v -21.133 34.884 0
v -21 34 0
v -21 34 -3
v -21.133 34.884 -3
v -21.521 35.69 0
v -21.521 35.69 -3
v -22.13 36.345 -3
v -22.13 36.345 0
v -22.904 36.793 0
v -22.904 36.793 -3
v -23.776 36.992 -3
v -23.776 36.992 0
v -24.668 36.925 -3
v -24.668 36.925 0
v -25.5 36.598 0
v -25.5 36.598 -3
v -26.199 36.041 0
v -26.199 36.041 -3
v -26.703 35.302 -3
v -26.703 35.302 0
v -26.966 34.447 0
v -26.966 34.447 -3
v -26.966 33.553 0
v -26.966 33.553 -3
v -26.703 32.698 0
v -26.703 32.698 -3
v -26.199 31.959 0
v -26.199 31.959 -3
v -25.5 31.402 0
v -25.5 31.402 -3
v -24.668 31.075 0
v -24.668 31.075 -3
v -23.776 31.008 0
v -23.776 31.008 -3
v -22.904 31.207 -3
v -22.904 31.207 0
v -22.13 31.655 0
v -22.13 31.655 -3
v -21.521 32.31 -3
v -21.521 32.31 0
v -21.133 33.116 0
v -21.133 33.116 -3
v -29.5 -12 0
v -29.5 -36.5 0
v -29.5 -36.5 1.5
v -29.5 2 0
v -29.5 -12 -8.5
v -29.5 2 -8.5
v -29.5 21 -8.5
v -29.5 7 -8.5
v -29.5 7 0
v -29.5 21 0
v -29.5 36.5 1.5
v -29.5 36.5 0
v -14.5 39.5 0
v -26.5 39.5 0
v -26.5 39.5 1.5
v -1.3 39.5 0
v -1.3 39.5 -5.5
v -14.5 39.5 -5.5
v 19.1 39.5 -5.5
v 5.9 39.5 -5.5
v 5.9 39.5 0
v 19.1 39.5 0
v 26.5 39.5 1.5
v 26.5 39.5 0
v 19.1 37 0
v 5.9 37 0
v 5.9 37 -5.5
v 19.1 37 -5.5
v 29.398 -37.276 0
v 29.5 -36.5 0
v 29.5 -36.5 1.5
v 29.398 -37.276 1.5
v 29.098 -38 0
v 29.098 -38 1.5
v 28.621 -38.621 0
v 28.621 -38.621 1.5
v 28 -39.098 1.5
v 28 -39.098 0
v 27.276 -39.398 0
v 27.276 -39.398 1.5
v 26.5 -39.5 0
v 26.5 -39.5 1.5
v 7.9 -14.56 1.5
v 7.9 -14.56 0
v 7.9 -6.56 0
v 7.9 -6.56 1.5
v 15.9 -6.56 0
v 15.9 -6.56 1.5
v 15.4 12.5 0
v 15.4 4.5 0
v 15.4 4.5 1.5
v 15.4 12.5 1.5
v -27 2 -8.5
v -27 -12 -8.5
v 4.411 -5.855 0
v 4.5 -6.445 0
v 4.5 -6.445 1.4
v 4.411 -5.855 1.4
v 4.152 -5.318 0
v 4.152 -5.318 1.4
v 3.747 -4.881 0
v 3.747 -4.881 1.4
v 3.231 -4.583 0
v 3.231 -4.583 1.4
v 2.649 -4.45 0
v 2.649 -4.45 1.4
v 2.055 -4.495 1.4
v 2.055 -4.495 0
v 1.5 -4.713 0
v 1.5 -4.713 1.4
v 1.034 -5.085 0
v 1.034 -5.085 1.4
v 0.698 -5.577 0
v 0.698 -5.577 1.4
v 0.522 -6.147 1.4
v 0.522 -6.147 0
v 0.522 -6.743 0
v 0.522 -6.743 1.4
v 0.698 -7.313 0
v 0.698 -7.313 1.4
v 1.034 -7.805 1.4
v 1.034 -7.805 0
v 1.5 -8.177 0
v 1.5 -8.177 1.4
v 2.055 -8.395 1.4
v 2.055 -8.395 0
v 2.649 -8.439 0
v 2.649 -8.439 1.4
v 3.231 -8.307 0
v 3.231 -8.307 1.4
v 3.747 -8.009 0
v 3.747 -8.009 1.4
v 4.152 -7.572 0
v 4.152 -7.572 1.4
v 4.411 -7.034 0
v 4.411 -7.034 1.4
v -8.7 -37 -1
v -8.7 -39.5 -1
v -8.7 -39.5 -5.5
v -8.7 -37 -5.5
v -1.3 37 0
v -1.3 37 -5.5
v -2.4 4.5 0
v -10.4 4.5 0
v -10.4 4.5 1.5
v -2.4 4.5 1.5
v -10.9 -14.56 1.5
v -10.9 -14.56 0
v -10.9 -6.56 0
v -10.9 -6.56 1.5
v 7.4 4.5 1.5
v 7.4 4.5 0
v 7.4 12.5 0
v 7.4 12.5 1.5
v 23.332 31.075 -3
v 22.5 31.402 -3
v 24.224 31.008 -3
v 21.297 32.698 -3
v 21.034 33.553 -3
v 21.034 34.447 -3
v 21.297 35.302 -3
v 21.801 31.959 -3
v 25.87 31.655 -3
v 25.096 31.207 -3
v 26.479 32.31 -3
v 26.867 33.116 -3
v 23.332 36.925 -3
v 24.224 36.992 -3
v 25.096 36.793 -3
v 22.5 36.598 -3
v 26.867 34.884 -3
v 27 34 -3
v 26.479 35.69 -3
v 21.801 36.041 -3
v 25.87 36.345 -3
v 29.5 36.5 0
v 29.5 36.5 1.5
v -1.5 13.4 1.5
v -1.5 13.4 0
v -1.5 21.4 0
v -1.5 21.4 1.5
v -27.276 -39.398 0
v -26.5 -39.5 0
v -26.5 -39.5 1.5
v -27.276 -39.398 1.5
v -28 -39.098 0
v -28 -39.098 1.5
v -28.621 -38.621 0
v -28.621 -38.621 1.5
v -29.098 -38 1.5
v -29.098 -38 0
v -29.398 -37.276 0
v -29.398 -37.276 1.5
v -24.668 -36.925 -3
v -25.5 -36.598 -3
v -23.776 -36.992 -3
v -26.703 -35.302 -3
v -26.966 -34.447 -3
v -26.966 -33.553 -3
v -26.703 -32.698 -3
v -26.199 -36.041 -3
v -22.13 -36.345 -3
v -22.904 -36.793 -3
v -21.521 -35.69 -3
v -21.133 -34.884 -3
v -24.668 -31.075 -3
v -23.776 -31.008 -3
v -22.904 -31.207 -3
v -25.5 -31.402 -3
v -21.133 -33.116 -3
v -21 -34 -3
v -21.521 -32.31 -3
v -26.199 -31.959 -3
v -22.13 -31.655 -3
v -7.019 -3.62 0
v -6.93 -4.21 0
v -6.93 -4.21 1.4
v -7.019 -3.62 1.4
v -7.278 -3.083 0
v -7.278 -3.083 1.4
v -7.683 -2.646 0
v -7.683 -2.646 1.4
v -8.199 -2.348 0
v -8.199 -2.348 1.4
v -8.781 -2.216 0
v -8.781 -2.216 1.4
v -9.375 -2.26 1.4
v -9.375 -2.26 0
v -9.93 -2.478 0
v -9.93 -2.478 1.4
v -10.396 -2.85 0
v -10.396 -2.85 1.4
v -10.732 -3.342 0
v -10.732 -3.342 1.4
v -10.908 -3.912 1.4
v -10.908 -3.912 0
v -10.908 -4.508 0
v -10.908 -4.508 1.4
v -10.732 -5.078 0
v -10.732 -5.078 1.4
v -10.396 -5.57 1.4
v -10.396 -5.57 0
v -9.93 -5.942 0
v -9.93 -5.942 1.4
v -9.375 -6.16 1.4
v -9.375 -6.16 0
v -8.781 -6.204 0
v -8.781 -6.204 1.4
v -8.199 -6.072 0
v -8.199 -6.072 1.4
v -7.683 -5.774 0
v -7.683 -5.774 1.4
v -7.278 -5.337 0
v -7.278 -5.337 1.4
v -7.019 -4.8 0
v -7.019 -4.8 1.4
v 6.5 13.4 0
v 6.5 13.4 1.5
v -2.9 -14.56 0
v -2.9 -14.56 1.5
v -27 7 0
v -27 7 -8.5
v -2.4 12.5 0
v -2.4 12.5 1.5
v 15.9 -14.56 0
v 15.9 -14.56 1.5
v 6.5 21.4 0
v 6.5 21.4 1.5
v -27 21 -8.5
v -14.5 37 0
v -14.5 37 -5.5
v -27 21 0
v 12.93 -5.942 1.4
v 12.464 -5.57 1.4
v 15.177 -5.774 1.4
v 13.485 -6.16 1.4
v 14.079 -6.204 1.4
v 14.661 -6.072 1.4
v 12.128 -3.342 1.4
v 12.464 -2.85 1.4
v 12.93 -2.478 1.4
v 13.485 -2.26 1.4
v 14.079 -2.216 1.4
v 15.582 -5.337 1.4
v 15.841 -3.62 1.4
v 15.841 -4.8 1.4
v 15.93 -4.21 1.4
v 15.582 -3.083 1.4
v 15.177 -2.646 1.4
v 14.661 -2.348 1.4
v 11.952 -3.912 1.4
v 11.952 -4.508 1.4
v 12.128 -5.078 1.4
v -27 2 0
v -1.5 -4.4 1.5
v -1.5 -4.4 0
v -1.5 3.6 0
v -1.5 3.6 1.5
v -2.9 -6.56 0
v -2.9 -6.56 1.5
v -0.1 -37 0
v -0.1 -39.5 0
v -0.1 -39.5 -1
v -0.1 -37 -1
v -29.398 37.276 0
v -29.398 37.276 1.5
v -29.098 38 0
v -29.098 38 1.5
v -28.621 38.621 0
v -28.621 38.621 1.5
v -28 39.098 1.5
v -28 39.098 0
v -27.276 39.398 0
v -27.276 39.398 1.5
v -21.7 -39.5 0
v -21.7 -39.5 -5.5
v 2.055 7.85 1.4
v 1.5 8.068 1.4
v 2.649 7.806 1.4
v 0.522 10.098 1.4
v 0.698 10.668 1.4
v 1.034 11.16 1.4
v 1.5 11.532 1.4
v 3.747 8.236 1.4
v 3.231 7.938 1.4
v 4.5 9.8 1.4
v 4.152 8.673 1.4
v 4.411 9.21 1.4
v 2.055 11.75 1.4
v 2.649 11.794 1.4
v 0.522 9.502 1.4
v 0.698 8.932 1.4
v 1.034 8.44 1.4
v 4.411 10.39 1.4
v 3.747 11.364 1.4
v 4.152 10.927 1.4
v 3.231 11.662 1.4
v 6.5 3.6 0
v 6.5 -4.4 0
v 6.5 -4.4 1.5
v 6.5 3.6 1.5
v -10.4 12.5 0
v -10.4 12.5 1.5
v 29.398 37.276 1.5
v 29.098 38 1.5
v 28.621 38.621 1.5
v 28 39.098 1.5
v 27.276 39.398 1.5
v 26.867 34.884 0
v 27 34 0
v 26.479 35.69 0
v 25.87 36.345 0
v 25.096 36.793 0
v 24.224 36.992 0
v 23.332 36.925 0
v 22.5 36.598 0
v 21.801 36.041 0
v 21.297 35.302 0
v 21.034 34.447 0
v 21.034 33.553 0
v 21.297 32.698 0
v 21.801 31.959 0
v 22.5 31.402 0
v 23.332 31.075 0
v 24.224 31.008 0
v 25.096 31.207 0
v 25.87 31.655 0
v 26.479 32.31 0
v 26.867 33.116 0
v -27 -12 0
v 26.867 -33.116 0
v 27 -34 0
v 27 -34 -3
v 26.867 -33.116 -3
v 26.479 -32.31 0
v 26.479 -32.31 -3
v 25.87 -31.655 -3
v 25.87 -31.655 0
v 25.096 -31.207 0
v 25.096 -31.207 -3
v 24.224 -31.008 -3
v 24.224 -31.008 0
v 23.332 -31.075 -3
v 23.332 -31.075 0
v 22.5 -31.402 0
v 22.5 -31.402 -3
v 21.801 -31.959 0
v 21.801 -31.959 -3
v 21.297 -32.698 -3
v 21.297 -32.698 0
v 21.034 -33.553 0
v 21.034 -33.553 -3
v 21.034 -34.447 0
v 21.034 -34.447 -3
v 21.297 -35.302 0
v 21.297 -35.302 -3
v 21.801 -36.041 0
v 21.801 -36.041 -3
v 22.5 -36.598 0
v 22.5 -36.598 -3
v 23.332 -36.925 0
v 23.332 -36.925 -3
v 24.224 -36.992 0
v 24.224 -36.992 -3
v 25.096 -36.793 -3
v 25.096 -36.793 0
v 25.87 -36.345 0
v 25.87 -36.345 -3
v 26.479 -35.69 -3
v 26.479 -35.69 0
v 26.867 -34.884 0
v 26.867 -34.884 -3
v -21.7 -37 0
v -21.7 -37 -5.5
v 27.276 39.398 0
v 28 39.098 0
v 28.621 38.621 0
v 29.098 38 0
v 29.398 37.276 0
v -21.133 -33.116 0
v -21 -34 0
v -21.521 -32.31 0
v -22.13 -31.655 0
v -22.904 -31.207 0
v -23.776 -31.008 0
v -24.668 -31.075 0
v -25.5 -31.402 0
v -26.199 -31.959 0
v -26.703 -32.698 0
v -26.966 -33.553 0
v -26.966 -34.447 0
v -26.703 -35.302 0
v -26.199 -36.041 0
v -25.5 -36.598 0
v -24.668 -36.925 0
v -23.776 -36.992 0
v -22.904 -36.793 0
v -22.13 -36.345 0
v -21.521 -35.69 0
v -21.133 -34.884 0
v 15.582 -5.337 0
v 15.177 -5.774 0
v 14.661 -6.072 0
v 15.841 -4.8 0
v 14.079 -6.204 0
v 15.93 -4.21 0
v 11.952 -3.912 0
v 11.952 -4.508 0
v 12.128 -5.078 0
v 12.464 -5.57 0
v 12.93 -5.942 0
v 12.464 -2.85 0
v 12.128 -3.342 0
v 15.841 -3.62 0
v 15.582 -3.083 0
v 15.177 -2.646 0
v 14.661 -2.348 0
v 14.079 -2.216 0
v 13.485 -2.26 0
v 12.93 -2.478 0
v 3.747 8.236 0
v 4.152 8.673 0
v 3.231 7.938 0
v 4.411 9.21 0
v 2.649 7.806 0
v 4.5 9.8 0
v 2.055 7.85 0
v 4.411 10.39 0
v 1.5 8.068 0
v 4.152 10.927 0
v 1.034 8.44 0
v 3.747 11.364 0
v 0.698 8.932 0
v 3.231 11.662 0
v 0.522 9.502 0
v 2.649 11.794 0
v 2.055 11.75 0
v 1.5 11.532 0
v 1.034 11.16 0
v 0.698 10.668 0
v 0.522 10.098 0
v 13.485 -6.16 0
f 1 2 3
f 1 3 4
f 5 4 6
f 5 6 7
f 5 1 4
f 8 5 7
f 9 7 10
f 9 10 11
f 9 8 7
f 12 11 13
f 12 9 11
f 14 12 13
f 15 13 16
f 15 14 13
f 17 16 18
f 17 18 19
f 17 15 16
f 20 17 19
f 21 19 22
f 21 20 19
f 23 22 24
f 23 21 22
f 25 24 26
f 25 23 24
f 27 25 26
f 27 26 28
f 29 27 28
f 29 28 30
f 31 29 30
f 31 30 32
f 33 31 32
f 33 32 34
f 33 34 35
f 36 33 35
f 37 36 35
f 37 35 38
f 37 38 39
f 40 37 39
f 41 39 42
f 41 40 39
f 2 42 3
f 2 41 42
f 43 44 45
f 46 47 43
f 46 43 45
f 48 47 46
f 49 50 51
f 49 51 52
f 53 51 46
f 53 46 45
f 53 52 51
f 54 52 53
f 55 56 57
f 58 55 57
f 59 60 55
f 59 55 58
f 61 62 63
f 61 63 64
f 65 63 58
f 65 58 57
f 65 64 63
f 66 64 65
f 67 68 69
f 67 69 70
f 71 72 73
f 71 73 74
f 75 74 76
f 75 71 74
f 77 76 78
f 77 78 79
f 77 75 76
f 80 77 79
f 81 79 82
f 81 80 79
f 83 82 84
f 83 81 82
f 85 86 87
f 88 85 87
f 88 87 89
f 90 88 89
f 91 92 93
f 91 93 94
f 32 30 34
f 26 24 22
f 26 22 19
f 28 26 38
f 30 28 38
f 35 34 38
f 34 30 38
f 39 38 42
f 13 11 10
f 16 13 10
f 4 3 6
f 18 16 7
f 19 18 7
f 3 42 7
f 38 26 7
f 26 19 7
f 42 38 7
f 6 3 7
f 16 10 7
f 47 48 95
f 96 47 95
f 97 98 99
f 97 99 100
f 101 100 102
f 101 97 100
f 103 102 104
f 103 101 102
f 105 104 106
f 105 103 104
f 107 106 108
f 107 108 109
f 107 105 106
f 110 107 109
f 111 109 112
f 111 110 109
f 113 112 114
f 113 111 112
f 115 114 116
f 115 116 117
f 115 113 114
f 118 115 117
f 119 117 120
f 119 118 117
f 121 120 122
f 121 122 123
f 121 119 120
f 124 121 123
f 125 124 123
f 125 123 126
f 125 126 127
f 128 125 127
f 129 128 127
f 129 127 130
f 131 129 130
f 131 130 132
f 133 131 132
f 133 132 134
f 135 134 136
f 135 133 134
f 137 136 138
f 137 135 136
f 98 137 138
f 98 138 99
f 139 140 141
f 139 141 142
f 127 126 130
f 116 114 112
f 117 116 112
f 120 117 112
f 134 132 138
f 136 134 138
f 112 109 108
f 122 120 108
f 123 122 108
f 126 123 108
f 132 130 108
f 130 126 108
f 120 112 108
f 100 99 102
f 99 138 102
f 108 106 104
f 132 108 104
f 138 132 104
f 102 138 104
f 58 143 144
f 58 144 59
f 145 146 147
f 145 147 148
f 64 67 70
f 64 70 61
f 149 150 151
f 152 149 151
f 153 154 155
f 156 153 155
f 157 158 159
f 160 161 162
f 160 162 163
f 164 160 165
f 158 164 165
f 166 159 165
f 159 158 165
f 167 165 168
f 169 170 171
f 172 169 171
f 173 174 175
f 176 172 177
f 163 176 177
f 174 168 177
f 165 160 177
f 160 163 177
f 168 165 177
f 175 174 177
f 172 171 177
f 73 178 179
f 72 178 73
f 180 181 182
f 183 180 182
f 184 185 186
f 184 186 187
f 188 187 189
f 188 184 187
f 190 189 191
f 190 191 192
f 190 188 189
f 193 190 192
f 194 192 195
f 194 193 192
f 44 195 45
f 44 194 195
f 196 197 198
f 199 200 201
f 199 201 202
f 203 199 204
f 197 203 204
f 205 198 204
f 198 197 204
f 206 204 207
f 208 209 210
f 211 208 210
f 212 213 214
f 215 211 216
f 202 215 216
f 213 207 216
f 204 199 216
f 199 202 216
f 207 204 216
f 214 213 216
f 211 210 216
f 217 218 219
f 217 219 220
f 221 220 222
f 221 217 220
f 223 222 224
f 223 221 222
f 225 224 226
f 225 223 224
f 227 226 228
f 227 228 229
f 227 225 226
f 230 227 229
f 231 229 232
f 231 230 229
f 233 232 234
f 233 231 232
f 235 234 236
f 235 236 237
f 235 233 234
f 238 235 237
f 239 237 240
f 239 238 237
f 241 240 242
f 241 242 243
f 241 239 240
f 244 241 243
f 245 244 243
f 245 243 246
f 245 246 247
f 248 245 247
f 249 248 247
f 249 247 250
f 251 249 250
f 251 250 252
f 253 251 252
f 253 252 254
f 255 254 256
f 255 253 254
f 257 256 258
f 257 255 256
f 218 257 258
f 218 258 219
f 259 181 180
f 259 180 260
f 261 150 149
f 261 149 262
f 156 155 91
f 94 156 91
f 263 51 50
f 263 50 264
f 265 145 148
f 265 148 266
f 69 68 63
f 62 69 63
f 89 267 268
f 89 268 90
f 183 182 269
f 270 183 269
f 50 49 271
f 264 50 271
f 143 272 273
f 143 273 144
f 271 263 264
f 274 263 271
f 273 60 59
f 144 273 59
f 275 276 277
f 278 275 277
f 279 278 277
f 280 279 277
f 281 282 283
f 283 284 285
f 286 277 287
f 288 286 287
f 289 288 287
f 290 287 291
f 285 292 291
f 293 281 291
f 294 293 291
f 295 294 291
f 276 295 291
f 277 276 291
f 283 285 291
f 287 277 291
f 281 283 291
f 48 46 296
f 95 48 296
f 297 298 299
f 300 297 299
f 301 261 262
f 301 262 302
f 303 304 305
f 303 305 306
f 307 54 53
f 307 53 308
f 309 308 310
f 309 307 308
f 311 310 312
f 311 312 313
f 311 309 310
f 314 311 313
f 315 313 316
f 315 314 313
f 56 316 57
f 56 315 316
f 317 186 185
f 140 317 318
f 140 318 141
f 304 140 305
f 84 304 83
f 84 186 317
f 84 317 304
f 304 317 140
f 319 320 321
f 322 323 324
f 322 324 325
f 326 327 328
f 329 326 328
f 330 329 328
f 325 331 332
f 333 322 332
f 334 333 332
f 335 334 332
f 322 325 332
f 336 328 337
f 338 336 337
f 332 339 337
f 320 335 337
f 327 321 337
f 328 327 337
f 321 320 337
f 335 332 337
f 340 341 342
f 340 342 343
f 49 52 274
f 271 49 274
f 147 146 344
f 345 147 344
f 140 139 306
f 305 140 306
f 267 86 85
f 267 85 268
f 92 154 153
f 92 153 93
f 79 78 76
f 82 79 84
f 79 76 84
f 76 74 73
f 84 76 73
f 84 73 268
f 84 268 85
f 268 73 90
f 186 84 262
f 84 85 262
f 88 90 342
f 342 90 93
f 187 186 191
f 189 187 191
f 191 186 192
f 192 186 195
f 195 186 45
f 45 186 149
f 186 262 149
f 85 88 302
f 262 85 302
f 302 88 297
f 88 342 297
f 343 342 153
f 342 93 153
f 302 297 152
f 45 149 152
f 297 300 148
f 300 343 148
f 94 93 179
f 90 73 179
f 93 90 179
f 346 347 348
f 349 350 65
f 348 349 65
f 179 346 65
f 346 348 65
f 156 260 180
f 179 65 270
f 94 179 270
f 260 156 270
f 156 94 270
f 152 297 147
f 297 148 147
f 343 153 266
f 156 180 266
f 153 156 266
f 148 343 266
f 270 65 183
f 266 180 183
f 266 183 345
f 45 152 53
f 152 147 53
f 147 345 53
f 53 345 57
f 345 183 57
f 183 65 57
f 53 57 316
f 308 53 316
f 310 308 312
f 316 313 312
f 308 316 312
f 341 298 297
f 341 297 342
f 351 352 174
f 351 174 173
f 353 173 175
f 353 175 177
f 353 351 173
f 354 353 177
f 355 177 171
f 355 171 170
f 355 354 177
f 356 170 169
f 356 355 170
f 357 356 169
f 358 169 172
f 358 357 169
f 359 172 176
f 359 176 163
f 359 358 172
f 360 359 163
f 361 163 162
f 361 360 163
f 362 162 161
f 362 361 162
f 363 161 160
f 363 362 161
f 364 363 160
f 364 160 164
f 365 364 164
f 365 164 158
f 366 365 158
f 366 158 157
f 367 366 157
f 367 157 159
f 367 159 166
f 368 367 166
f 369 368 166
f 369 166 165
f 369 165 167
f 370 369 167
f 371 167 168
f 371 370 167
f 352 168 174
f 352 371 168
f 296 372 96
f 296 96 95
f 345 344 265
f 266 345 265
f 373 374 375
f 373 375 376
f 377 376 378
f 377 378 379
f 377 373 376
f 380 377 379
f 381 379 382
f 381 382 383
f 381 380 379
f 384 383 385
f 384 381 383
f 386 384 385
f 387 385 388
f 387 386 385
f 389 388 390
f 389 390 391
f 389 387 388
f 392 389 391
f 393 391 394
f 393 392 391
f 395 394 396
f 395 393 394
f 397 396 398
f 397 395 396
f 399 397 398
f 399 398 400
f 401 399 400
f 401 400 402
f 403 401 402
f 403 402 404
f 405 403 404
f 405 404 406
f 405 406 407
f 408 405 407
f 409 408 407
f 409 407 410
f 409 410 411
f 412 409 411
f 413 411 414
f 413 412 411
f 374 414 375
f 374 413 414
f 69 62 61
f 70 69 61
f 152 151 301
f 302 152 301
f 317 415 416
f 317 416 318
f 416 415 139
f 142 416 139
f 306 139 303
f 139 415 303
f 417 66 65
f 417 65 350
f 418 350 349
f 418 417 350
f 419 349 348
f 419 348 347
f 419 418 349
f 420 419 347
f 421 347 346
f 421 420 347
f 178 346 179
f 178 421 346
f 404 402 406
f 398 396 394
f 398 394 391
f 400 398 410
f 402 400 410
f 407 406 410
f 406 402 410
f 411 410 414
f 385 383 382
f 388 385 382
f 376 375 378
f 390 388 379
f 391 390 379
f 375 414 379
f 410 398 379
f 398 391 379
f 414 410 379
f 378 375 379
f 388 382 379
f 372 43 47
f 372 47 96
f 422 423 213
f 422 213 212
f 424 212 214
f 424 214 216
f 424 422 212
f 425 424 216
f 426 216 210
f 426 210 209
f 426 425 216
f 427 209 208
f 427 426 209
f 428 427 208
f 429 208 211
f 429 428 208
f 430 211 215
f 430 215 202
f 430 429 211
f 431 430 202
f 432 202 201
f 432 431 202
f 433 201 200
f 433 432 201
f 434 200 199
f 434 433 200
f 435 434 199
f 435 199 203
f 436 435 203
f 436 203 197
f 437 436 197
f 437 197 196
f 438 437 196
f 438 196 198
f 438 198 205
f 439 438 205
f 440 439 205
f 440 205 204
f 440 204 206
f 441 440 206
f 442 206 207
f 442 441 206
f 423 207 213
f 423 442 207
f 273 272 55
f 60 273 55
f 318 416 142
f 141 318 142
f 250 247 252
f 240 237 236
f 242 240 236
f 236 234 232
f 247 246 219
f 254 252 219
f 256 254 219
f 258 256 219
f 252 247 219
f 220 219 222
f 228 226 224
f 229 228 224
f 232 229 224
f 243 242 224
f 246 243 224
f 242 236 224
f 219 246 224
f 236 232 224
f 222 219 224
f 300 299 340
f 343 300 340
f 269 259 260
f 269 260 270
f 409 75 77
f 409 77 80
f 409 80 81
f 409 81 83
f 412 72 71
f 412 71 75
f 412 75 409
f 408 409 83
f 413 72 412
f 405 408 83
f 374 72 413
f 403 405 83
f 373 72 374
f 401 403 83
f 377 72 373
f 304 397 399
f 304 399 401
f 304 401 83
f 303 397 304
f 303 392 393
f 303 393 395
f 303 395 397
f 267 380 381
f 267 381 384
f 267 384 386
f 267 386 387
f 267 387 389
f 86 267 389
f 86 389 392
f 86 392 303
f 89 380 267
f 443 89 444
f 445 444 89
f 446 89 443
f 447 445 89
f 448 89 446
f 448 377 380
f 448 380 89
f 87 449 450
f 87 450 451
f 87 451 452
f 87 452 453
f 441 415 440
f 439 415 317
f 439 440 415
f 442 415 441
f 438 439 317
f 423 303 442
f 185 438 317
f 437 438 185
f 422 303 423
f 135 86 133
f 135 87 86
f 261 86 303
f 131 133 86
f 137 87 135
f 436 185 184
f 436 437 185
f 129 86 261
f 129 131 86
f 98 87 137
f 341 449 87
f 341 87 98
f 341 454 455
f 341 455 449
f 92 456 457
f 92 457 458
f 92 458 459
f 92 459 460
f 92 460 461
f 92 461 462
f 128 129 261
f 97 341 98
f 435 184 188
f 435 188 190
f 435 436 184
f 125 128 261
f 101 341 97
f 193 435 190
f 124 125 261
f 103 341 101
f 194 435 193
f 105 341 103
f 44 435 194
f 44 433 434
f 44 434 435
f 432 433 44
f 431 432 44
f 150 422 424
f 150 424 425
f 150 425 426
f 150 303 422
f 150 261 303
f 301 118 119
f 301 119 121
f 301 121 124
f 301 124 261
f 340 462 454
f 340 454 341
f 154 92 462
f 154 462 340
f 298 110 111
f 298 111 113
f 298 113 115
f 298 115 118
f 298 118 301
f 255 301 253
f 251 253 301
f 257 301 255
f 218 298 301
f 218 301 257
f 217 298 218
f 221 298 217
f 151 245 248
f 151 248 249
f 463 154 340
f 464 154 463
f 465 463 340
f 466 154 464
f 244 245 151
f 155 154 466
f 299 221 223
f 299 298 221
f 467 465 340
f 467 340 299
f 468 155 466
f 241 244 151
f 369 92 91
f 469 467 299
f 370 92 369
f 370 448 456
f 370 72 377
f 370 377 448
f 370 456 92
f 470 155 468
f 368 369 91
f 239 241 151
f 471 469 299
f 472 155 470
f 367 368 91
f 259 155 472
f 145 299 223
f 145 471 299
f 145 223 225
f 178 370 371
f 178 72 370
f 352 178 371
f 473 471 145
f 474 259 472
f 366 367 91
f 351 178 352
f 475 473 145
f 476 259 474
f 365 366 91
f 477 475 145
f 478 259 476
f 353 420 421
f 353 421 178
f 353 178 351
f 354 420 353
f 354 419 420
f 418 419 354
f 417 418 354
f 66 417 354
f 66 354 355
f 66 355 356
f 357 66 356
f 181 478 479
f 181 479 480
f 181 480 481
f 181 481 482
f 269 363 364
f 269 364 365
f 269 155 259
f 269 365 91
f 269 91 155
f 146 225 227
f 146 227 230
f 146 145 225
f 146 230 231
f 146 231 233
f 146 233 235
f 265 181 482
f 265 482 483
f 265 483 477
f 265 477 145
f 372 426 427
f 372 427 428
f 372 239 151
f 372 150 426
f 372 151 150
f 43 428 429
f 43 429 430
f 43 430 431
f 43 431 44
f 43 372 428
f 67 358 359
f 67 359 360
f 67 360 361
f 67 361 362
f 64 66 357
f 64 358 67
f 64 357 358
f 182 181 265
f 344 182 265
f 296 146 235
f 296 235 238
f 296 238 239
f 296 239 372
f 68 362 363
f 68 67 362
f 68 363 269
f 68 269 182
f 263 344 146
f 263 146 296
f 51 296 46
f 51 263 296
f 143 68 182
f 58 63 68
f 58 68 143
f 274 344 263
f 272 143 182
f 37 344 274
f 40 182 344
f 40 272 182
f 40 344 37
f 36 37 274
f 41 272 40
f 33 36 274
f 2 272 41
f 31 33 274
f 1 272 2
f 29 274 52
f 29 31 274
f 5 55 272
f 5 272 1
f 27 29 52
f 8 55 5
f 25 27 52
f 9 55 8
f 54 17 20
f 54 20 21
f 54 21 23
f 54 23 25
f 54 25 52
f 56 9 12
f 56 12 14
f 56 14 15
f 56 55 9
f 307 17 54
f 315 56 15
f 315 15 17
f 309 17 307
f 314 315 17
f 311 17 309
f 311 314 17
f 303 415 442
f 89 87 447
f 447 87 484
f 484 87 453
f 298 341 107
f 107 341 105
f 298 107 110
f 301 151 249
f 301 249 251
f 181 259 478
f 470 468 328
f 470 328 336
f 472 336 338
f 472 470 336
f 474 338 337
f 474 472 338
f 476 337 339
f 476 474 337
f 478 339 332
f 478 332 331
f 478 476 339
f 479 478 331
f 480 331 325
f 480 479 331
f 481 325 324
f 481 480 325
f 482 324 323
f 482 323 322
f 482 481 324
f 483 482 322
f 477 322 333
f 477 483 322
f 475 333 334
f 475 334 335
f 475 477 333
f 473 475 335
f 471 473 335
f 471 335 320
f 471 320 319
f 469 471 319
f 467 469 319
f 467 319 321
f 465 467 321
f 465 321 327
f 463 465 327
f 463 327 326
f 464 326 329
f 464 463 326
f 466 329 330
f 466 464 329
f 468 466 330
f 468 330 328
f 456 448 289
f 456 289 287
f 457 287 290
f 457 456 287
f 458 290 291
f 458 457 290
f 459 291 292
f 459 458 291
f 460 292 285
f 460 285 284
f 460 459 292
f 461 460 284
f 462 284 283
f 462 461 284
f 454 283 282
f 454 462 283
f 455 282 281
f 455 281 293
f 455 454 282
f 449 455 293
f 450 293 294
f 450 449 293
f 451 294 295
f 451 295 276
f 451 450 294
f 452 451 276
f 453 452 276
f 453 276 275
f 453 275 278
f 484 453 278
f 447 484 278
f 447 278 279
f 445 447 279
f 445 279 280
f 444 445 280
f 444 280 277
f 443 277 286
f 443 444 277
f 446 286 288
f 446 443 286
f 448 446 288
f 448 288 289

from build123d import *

# Parameters (mm, degrees)
EXTRUDE_1_DEPTH     = 1.5
SKETCH_1_10_W       = 2.5
SKETCH_1_10_H       = 14
EXTRUDE_2_DEPTH     = 8.5
SKETCH_1_11_W       = 13.2
SKETCH_1_11_H       = 2.5
SKETCH_1_11_W_2     = 13
EXTRUDE_3_DEPTH     = 5.5
SKETCH_1_13_R       = 3
EXTRUDE_4_DEPTH     = 3
SKETCH_1_14_W       = 8.6
SKETCH_1_14_H       = 2.5
EXTRUDE_5_DEPTH     = 1
SKETCH_1_15_R       = 2
CUT_EXTRUDE_1_DEPTH = 1.4


with BuildPart() as part:
    # 草图1 → 凸台-拉伸1 (new body)
    with BuildSketch(Plane.XY):
        with BuildLine():
            ThreePointArc((-26.5, 39.5), (-28.621320344, 38.621320344), (-29.5, 36.5))
            Line((-29.5, 36.5), (-29.5, -36.5))
            ThreePointArc((-29.5, -36.5), (-28.621320344, -38.621320344), (-26.5, -39.5))
            Line((-26.5, -39.5), (26.5, -39.5))
            ThreePointArc((26.5, -39.5), (28.621320344, -38.621320344), (29.5, -36.5))
            Line((29.5, -36.5), (29.5, 36.5))
            ThreePointArc((29.5, 36.5), (28.621320344, 38.621320344), (26.5, 39.5))
            Line((26.5, 39.5), (-26.5, 39.5))
        make_face()
        Polygon((-2.9, -6.56), (-2.9, -10.56), (-2.9, -14.56), (-10.9, -14.56), (-10.9, -6.56), align=None, mode=Mode.SUBTRACT)
        Polygon((7.9, -14.56), (7.9, -10.56), (7.9, -6.56), (15.9, -6.56), (15.9, -14.56), align=None, mode=Mode.SUBTRACT)
        Polygon((-1.5, 3.6), (2.5, 3.6), (6.5, 3.6), (6.5, -4.4), (2.5, -4.4), (-1.5, -4.4), align=None, mode=Mode.SUBTRACT)
        Polygon((-2.4, 12.5), (-2.4, 8.5), (-2.4, 4.5), (-10.4, 4.5), (-10.4, 12.5), align=None, mode=Mode.SUBTRACT)
        Polygon((7.4, 8.5), (7.4, 12.5), (15.4, 12.5), (15.4, 4.5), (7.4, 4.5), align=None, mode=Mode.SUBTRACT)
        Polygon((6.5, 13.4), (2.5, 13.4), (-1.5, 13.4), (-1.5, 21.4), (6.5, 21.4), align=None, mode=Mode.SUBTRACT)
    extrude(amount=EXTRUDE_1_DEPTH)

    # 草图1<10> → 凸台-拉伸2 (add)
    with BuildSketch(Plane.XY):
        with Locations((-28.25, 14)):
            Rectangle(SKETCH_1_10_W, SKETCH_1_10_H)
        with Locations((-28.25, -5)):
            Rectangle(SKETCH_1_10_W, SKETCH_1_10_H)
    extrude(amount=-EXTRUDE_2_DEPTH)

    # 草图1<11> → 凸台-拉伸3 (add)
    with BuildSketch(Plane.XY):
        with Locations((-7.9, 38.25)):
            Rectangle(SKETCH_1_11_W, SKETCH_1_11_H)
        with Locations((12.5, 38.25)):
            Rectangle(SKETCH_1_11_W, SKETCH_1_11_H)
        with Locations((-15.2, -38.25)):
            Rectangle(SKETCH_1_11_W_2, SKETCH_1_11_H)
    extrude(amount=-EXTRUDE_3_DEPTH)

    # 草图1<13> → 凸台-拉伸4 (add)
    with BuildSketch(Plane.XY):
        with Locations((24, 34)):
            Circle(SKETCH_1_13_R)
        with Locations((-24, 34)):
            Circle(SKETCH_1_13_R)
        with Locations((-24, -34)):
            Circle(SKETCH_1_13_R)
        with Locations((24, -34)):
            Circle(SKETCH_1_13_R)
    extrude(amount=-EXTRUDE_4_DEPTH)

    # 草图1<14> → 凸台-拉伸5 (add)
    with BuildSketch(Plane.XY):
        with Locations((-4.4, -38.25)):
            Rectangle(SKETCH_1_14_W, SKETCH_1_14_H)
    extrude(amount=-EXTRUDE_5_DEPTH)

    # 草图1<15> → 切除-拉伸1 (cut)
    with BuildSketch(Plane.XY):
        with Locations((2.5, 9.8)):
            Circle(SKETCH_1_15_R)
        with Locations((-8.93, -4.21)):
            Circle(SKETCH_1_15_R)
        with Locations((13.93, -4.21)):
            Circle(SKETCH_1_15_R)
        with Locations((2.5, -6.444870341)):
            Circle(SKETCH_1_15_R)
    extrude(amount=CUT_EXTRUDE_1_DEPTH, mode=Mode.SUBTRACT)


solid = part.part
